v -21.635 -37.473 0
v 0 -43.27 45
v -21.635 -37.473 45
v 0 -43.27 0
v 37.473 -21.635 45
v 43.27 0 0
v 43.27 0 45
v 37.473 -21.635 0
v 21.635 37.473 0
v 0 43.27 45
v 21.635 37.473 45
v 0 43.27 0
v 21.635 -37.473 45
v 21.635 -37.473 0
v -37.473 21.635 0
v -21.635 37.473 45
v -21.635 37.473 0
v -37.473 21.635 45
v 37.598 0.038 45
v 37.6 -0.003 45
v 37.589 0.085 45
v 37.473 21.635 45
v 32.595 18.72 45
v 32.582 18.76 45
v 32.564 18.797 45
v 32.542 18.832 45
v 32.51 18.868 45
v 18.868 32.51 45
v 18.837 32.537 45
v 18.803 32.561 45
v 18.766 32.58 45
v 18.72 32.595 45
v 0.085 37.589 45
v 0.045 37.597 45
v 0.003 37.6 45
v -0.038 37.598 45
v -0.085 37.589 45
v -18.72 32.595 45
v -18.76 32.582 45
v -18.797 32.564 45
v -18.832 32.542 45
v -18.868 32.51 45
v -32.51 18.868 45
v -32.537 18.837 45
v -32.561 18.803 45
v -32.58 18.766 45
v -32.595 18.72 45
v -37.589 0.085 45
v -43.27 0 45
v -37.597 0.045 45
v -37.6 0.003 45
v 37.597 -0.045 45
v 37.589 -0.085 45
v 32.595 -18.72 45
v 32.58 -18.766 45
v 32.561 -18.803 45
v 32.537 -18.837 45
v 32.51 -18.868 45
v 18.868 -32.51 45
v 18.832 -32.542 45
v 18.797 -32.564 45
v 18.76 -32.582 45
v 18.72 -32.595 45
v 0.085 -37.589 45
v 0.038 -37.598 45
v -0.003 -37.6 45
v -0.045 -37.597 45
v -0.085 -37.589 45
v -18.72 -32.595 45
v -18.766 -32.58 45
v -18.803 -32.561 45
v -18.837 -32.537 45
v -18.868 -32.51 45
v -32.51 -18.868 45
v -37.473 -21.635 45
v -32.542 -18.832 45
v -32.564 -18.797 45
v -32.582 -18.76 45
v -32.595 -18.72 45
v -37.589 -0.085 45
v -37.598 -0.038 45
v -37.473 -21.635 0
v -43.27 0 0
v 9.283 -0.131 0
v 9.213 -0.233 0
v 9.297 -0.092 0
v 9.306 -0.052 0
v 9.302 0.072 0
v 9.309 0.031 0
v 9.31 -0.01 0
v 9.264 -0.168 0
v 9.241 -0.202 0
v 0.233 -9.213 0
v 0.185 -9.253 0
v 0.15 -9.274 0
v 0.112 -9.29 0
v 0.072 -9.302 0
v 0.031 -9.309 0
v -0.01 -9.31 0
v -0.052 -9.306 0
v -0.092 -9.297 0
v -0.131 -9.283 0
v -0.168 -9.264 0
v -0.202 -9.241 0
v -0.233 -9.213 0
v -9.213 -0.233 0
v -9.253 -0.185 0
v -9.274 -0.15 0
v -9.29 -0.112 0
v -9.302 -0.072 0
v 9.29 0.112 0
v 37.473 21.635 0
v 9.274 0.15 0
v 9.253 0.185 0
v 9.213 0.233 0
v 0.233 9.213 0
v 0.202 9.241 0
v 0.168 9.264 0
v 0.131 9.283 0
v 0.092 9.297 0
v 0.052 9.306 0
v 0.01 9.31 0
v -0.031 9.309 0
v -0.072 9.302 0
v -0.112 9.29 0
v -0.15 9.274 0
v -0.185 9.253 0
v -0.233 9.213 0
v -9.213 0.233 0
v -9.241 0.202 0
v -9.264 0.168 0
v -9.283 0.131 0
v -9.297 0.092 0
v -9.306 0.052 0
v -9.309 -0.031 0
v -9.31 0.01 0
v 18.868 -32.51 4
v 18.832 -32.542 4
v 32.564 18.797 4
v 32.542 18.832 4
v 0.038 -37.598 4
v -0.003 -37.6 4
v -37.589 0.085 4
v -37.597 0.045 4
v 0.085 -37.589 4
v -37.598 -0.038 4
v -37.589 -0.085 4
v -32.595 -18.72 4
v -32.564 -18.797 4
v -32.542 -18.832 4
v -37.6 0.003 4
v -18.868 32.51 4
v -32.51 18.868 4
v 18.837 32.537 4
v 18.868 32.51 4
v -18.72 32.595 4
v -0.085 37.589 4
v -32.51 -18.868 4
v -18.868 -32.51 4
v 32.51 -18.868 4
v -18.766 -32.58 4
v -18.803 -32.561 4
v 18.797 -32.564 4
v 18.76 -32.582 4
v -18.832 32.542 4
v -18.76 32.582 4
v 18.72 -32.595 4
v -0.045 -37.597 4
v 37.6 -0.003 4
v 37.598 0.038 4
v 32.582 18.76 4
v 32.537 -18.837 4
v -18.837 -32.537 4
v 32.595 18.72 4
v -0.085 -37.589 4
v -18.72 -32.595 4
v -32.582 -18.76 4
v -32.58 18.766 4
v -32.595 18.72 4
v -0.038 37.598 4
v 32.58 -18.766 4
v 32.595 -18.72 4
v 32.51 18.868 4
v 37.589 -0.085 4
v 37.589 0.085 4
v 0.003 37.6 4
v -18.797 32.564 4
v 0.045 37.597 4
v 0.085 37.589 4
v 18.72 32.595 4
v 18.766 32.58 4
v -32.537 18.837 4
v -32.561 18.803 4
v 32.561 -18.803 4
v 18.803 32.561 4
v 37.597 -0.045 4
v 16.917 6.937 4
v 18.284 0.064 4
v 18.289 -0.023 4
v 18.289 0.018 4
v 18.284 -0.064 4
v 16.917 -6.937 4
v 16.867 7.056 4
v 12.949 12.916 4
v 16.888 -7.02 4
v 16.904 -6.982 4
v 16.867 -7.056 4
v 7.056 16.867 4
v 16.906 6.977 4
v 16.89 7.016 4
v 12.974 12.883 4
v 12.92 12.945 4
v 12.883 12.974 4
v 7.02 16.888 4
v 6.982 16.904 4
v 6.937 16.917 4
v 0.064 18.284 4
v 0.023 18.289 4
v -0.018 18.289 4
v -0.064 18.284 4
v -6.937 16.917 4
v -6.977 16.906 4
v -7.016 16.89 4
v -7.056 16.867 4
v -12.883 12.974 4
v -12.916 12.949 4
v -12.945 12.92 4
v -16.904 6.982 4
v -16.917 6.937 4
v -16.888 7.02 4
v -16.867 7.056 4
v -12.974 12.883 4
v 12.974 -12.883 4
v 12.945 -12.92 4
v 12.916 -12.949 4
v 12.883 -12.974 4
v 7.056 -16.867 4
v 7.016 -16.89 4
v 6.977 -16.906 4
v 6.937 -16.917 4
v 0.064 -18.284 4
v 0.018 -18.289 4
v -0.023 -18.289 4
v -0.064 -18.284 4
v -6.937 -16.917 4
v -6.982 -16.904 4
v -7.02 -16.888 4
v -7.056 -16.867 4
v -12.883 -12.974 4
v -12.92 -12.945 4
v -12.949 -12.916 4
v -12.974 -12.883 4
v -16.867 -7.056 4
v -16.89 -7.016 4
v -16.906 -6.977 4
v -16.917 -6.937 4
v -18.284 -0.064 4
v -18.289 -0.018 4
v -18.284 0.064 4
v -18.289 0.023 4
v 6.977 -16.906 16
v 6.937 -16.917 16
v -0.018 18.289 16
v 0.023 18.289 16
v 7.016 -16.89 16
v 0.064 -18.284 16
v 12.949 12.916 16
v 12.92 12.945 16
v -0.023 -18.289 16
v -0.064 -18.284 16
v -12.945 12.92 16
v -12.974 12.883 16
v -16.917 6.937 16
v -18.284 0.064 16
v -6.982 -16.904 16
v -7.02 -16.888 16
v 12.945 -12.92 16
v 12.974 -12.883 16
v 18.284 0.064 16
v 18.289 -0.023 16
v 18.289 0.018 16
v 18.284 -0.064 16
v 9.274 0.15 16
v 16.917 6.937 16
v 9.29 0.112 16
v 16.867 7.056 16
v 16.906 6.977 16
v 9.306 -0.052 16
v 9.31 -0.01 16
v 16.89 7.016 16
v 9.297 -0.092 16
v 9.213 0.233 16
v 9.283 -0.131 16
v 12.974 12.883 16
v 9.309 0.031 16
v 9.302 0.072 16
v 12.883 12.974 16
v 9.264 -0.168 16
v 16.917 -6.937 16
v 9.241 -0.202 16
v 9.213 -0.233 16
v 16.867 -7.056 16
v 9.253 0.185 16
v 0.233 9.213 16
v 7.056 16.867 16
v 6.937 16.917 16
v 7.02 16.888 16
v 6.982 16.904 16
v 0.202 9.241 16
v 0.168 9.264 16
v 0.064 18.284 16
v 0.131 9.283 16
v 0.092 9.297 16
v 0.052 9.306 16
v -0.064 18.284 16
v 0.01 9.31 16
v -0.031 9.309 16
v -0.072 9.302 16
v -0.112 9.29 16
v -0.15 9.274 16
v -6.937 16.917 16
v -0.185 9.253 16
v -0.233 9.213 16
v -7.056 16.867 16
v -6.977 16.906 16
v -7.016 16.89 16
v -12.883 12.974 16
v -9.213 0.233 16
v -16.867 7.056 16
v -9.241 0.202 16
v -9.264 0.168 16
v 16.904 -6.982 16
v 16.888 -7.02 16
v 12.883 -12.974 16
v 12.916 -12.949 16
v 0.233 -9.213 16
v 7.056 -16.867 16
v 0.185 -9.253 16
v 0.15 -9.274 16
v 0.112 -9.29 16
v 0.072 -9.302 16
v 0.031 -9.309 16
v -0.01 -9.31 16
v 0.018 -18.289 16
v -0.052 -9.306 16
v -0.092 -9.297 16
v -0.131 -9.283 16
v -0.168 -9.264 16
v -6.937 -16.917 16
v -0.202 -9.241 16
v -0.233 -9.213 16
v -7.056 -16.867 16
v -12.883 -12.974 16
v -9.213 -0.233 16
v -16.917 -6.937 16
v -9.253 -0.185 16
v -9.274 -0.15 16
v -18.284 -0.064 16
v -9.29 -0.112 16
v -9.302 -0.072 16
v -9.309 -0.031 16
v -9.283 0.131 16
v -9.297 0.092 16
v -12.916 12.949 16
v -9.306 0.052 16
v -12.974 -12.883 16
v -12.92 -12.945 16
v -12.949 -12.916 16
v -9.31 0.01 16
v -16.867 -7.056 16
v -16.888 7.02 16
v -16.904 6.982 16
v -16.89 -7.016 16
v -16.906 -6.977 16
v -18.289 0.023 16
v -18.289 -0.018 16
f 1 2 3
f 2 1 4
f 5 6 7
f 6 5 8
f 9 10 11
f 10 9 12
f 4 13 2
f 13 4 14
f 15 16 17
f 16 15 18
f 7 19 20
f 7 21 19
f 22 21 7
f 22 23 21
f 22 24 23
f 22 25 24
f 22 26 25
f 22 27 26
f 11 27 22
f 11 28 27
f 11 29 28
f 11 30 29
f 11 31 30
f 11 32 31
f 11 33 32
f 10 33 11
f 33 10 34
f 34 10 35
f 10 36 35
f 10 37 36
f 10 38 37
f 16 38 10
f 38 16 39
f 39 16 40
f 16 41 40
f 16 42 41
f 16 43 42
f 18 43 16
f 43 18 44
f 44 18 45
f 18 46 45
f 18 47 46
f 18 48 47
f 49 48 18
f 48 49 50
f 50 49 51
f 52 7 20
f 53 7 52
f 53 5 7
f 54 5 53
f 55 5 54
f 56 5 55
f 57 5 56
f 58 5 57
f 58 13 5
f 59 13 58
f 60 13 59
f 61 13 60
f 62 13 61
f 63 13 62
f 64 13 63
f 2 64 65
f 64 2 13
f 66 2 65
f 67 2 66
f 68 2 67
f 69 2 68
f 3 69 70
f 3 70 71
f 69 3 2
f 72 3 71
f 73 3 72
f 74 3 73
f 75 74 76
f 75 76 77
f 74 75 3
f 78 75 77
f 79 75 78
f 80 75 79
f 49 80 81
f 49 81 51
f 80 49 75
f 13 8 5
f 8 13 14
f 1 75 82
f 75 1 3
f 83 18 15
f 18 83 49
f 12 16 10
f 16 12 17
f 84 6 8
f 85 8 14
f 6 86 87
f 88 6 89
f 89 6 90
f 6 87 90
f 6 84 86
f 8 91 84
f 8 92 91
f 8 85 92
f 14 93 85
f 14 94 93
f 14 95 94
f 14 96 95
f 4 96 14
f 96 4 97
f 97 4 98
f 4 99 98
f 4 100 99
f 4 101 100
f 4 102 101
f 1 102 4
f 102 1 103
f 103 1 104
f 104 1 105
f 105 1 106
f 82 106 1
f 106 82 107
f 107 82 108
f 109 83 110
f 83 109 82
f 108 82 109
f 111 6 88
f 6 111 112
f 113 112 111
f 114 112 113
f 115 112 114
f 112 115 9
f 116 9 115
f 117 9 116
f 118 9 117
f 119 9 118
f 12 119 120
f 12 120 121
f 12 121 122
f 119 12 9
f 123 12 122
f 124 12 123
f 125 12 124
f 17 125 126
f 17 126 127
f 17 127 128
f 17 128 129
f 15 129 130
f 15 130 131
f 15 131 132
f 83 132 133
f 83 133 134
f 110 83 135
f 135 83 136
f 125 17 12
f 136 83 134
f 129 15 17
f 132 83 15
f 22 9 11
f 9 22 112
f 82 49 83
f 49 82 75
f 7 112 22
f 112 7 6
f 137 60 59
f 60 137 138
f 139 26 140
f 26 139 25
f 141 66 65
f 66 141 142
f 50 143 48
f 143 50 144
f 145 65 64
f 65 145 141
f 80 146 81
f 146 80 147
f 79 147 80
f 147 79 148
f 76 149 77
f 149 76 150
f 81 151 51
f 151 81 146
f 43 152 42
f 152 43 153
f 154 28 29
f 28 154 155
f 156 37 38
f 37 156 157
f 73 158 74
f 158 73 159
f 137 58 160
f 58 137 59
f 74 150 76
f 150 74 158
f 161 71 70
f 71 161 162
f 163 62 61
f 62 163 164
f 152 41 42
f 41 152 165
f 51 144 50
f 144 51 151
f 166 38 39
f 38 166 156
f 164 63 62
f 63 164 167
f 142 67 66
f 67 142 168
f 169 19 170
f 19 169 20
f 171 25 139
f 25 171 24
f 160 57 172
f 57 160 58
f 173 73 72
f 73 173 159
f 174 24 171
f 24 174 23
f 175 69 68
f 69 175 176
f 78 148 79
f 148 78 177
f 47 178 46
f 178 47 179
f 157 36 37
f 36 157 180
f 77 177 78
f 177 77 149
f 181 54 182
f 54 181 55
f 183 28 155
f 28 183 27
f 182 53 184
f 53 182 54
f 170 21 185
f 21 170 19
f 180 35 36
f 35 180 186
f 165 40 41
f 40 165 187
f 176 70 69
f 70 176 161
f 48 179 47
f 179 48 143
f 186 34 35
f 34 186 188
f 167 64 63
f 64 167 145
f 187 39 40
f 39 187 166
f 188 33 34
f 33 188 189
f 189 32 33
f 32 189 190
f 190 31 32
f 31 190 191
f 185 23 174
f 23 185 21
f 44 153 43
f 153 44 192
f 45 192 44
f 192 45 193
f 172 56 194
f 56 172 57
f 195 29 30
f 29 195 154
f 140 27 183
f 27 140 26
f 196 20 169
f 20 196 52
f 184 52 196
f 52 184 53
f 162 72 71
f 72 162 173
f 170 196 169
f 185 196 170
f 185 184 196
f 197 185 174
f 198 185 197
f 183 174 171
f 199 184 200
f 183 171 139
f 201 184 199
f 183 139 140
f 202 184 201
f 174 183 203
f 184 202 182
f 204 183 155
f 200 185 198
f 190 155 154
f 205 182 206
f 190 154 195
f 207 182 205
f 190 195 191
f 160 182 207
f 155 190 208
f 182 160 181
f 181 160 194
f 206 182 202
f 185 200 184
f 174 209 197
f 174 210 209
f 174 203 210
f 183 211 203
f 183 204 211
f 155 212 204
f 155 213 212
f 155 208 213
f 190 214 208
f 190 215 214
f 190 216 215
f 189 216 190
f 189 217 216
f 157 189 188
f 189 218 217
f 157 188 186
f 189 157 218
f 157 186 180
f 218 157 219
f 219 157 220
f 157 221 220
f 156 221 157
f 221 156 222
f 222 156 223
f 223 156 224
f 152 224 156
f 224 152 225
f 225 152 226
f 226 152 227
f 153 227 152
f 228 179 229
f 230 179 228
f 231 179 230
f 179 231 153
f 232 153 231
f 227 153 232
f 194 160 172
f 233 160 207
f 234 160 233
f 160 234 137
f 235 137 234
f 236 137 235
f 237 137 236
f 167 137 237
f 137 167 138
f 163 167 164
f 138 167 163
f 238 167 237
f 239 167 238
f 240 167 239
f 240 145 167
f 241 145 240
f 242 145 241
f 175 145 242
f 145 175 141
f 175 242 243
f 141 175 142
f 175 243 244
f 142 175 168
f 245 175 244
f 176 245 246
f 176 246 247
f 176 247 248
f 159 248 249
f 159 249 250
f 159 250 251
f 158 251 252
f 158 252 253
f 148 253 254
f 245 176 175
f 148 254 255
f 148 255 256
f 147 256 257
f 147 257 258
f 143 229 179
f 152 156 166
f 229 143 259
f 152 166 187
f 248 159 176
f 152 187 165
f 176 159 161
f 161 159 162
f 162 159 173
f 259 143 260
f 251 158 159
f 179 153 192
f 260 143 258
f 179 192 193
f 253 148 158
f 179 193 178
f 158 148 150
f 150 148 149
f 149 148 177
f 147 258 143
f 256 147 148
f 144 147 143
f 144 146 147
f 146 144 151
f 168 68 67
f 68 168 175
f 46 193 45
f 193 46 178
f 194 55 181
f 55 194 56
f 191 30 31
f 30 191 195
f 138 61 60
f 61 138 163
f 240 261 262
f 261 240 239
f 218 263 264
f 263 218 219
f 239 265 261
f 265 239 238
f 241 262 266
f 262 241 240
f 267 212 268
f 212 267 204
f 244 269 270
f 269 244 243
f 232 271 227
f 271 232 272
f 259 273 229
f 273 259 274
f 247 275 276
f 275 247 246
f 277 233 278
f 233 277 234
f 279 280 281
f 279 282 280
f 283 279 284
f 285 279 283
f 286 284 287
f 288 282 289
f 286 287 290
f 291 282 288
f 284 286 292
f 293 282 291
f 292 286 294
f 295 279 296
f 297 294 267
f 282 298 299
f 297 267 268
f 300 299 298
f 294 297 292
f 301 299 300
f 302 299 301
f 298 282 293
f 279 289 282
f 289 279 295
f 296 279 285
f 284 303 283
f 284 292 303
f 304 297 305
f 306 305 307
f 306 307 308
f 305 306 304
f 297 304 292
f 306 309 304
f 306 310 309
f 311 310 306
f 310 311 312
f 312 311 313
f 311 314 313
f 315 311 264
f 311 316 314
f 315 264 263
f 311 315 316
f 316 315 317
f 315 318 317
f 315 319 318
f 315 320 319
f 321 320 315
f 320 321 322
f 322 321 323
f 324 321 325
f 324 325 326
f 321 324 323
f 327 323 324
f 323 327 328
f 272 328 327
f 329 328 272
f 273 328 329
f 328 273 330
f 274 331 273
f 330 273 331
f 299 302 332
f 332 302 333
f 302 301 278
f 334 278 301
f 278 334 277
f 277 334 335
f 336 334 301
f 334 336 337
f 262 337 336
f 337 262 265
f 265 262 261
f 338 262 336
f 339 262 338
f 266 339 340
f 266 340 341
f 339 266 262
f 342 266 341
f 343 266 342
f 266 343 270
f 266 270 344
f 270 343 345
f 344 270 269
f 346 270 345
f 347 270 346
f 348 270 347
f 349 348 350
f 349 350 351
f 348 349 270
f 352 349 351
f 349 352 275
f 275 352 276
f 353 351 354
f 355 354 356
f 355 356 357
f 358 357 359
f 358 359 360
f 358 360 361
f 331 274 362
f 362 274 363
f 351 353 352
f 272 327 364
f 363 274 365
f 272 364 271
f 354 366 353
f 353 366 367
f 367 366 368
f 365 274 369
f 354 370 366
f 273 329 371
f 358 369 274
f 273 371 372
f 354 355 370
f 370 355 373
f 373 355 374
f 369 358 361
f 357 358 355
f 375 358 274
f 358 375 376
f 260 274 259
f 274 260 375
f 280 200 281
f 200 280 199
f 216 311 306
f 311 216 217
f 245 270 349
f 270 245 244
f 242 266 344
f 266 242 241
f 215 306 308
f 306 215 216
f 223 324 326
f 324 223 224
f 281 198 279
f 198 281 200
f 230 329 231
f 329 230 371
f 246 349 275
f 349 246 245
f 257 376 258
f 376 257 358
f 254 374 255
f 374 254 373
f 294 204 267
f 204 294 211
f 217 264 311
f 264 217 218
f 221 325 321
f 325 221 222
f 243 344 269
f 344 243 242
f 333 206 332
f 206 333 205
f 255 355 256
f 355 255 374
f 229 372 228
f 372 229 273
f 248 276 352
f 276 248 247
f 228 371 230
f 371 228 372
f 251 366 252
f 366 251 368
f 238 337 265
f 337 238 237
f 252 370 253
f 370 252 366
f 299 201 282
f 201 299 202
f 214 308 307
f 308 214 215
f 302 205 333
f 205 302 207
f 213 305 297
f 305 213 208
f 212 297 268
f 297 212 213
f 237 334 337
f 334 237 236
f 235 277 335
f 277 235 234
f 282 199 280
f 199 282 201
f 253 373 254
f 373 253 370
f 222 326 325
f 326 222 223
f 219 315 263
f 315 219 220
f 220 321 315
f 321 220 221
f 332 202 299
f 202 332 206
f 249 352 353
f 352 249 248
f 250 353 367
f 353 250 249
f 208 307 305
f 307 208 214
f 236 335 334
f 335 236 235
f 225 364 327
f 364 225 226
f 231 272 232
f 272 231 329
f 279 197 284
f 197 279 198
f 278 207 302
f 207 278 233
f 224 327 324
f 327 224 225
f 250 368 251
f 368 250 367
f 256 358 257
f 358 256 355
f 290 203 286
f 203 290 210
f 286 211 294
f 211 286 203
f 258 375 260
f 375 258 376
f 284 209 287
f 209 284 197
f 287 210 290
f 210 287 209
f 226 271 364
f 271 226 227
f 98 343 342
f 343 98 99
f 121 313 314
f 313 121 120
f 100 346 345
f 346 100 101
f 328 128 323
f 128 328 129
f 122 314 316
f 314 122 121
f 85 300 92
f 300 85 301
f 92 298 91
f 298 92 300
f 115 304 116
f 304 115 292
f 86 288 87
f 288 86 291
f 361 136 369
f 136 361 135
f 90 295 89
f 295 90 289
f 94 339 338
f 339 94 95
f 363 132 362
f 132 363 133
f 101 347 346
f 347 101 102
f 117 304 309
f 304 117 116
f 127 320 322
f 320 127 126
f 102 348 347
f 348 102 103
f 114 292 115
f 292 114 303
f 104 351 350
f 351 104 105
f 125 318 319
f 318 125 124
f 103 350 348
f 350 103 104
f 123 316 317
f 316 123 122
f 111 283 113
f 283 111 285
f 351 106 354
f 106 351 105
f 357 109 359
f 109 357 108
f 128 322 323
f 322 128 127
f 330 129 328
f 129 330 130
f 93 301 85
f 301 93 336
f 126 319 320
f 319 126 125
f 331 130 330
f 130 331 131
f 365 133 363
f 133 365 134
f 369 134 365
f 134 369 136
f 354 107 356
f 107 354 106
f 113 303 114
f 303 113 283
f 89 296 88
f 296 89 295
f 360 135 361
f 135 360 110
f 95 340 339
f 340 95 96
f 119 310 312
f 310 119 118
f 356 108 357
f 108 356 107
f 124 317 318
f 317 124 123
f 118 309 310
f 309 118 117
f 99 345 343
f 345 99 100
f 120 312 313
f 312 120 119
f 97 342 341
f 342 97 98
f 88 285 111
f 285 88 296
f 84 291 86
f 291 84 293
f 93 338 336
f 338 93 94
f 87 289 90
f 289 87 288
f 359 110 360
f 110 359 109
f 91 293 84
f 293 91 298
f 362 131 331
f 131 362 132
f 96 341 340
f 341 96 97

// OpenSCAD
// NOTE:  All dimensions in mm except ratchet size

// version 5:  Use face-to-face measurement for even number of sides


//-------------------------------------------
//        User-entered parameters
//
//  Formatted for thingiverse customizer.
//-------------------------------------------

// Number of faces on filter body:
num_faces = 12;                     // [6:30]

// Diameter of filter body in mm.  Measure from face to face (even) or face to vertex (odd).
filter_diameter_mm = 72;

// Depth of usable portion of tool in mm.  (Height above bottom and drive).
usable_tool_depth_mm = 29;

// Ratchet drive size in inches.
drive_size_inches = 0.5;            // [0.375, 0.5]

// Thickness of tool wall in mm.
wall_thickness_mm = 6;

// Thickness of tool bottom in mm.
bottom_thickness_mm = 4;

// Make the outside round?
round_outside = 0;                  // [0:No,1:Yes]




/* [Hidden] */

$fn=50;

// Compute the radius from center to inner corner:
angle = 180 / num_faces;
r_to_face_if_odd_mm = (cos(angle) / (1+cos(angle))) * filter_diameter_mm;
R_if_even_mm = (filter_diameter_mm / 2) / cos(angle);
is_odd = (num_faces % 2);
radius_to_corners_mm = is_odd ? filter_diameter_mm - r_to_face_if_odd_mm : R_if_even_mm;     // from center to "corner", not face
filter_slop_r_mm = 0.33;

//echo (radius_to_corners_mm);

// 1/2" drive is exactly 8.98mm radius
// 3/8" drive is exactly 6.74mm radius
drive_hole_r_mm = (drive_size_inches > 0.4) ?  8.98 :  6.74;

// 1/2" drive is 16mm tall
// 3/8" drive is 11mm tall
drive_height_mm = (drive_size_inches > 0.4) ? 16.00 : 11.00;

drive_hole_slop_r_mm = 0.33;
drive_thickness_r_mm = drive_hole_r_mm;

outside_faces = round_outside ? 100 : num_faces;
outside_height_mm = usable_tool_depth_mm + max(drive_height_mm,bottom_thickness_mm);



difference()
{
    union()
    {
        difference()
        {
            // Outside body:
            linear_extrude(outside_height_mm)
                my_regular_polygon(outside_faces, radius_to_corners_mm+wall_thickness_mm);
            
            // Main Polygon hole:
            translate([0,0,bottom_thickness_mm])
                linear_extrude(outside_height_mm - bottom_thickness_mm)
                    offset(filter_slop_r_mm)
                        my_regular_polygon(num_faces, radius_to_corners_mm);
        }

        // Drive body:
        linear_extrude(drive_height_mm)
            offset(drive_hole_slop_r_mm)
                my_regular_polygon(16,drive_hole_r_mm+drive_thickness_r_mm);
    }

    // Drive hole:
    linear_extrude(drive_height_mm)
        offset(drive_hole_slop_r_mm)
            my_regular_polygon(4,drive_hole_r_mm);
}





module my_regular_polygon(faces, radius)
{
    $fn = faces;
    circle(radius);
}
